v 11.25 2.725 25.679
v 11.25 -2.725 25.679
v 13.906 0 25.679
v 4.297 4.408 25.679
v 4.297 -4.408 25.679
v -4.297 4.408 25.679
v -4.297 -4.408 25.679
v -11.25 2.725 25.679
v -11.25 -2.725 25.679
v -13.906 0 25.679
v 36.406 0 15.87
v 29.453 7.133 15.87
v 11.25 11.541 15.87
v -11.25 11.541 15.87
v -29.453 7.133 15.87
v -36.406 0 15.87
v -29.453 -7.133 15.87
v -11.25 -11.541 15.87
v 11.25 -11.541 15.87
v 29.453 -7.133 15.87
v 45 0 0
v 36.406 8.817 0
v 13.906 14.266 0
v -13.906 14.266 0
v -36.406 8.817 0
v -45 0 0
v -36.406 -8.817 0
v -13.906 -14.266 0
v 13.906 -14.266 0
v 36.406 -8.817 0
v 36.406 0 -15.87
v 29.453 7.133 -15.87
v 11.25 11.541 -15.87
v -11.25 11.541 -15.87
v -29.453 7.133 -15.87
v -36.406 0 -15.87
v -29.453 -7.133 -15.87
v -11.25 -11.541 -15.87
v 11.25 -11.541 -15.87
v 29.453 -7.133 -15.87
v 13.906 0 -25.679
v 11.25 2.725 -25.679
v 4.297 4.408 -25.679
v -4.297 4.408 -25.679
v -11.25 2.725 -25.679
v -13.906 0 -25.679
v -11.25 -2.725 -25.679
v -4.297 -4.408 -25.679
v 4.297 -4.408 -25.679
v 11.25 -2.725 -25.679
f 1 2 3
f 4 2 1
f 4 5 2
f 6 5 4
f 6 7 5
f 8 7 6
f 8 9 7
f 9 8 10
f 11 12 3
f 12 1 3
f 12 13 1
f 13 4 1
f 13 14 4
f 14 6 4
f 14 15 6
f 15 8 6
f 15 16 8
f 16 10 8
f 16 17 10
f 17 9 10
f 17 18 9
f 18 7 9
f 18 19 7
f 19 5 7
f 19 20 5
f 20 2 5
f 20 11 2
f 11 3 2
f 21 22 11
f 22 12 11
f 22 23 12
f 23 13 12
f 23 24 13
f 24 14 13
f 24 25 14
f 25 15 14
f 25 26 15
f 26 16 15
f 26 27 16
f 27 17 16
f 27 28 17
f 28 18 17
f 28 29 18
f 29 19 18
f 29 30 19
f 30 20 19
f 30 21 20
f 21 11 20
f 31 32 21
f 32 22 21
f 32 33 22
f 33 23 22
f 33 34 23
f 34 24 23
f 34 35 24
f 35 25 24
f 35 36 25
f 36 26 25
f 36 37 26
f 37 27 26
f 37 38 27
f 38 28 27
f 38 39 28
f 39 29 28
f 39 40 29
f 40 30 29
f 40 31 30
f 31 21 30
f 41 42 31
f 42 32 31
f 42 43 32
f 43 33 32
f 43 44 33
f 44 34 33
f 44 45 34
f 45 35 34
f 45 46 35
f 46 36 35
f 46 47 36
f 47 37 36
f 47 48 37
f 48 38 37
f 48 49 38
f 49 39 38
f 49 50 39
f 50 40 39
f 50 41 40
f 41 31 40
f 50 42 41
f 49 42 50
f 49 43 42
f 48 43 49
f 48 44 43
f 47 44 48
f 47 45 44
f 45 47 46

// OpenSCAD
// Generated by SolidPython 1.0.1 on 2020-07-29 00:46:51


scale(v = [15, 5, 9]) {
	sphere(r = 3);
}
/***********************************************
*********      SolidPython code:      **********
************************************************
 
# import packages: SolidPython
from solid import *
from solid.utils import *
from itertools import chain, combinations, permutations


class Resize:

    def __init__(self, scad_file):
        self.scad_file = scad_file
        #self.scad_file = import_scad(scad_file)
        # cone/cylinder param:
        self.r1 = 0
        self.r2 = 0
        self.h = 0
        # rectangular prism param:
        self.w = 0
        self.l = 0
        # ellipse param:
        self.r = 0

    # import OpenScad code (file name corresponds to shape)


    # classify shape + parameters
    def assign(self, param1, param2, param3):
        if self.scad_file == 'cone.scad':
            self.r1 = param1
            self.r2 = param2
            self.h = param3
        elif self.scad_file == 'cylinder.scad':
            self.r1 = param1
            self.r2 = param2
            self.h = param3
        elif self.scad_file == 'rectangularPrism.scad':
            self.h = param1
            self.l = param2
            self.w = param3
        else:
            self.r = param1
            self.h = param2

    # resize parameters
    def iterate(self):
        x = range(3, 20, 2)
        i = 1
        if self.scad_file == 'cone.scad':
            tempList = list(permutations(x, 2))
            for temp in tempList:
                param1 = temp[0]
                param2 = temp[1]
                filepath = 'produced_scad_files/' + 'cone' + str(param1) + '_' + str(param2) + '_' + '.scad'
                scad_render_to_file(cylinder(h=param1, r1=param2, r2=0), filepath)

        elif self.scad_file == 'cylinder.scad':
            tempList = list(permutations(x, 3))
            for temp in tempList:
                param1 = temp[0]
                param2 = temp[1]
                filepath = 'produced_scad_files/' + 'cylinder' + str(param1) + '_' + str(param2) + '_' + '.scad'
                scad_render_to_file(cylinder(h=param1, r1=param2, r2=param2), filepath)

        elif self.scad_file == 'rectangularPrism.scad':
            tempList = list(permutations(x, 3))
            for temp in tempList:
                param1 = temp[0]
                param2 = temp[1]
                param3 = temp[2]
                filepath = 'produced_scad_files/' + 'rectangularPrism' + str(param1) + '_' + str(param2) + '_' + str(
                    param3) + '.scad'
                scad_render_to_file(cube(size=(param1, param2, param3)), filepath)

        elif self.scad_file == 'ellipse.scad':
            tempList = list(permutations(x, 4))
            for temp in tempList:
                param1 = temp[0]
                param2 = temp[1]
                param3 = temp[2]
                param4 = temp[3]
                filepath = 'produced_scad_files/' + 'ellipse' + str(param1) + '_' + str(param2) + '_' + str(param3) + '_' + str(param4) + '.scad'
                scad_render_to_file(scale([param1, param2, param3])(sphere(r=param4)), filepath)

    def render_to_scadfile(self):
        scad_render_to_file(scad, 'example.scad') 
 
************************************************/
